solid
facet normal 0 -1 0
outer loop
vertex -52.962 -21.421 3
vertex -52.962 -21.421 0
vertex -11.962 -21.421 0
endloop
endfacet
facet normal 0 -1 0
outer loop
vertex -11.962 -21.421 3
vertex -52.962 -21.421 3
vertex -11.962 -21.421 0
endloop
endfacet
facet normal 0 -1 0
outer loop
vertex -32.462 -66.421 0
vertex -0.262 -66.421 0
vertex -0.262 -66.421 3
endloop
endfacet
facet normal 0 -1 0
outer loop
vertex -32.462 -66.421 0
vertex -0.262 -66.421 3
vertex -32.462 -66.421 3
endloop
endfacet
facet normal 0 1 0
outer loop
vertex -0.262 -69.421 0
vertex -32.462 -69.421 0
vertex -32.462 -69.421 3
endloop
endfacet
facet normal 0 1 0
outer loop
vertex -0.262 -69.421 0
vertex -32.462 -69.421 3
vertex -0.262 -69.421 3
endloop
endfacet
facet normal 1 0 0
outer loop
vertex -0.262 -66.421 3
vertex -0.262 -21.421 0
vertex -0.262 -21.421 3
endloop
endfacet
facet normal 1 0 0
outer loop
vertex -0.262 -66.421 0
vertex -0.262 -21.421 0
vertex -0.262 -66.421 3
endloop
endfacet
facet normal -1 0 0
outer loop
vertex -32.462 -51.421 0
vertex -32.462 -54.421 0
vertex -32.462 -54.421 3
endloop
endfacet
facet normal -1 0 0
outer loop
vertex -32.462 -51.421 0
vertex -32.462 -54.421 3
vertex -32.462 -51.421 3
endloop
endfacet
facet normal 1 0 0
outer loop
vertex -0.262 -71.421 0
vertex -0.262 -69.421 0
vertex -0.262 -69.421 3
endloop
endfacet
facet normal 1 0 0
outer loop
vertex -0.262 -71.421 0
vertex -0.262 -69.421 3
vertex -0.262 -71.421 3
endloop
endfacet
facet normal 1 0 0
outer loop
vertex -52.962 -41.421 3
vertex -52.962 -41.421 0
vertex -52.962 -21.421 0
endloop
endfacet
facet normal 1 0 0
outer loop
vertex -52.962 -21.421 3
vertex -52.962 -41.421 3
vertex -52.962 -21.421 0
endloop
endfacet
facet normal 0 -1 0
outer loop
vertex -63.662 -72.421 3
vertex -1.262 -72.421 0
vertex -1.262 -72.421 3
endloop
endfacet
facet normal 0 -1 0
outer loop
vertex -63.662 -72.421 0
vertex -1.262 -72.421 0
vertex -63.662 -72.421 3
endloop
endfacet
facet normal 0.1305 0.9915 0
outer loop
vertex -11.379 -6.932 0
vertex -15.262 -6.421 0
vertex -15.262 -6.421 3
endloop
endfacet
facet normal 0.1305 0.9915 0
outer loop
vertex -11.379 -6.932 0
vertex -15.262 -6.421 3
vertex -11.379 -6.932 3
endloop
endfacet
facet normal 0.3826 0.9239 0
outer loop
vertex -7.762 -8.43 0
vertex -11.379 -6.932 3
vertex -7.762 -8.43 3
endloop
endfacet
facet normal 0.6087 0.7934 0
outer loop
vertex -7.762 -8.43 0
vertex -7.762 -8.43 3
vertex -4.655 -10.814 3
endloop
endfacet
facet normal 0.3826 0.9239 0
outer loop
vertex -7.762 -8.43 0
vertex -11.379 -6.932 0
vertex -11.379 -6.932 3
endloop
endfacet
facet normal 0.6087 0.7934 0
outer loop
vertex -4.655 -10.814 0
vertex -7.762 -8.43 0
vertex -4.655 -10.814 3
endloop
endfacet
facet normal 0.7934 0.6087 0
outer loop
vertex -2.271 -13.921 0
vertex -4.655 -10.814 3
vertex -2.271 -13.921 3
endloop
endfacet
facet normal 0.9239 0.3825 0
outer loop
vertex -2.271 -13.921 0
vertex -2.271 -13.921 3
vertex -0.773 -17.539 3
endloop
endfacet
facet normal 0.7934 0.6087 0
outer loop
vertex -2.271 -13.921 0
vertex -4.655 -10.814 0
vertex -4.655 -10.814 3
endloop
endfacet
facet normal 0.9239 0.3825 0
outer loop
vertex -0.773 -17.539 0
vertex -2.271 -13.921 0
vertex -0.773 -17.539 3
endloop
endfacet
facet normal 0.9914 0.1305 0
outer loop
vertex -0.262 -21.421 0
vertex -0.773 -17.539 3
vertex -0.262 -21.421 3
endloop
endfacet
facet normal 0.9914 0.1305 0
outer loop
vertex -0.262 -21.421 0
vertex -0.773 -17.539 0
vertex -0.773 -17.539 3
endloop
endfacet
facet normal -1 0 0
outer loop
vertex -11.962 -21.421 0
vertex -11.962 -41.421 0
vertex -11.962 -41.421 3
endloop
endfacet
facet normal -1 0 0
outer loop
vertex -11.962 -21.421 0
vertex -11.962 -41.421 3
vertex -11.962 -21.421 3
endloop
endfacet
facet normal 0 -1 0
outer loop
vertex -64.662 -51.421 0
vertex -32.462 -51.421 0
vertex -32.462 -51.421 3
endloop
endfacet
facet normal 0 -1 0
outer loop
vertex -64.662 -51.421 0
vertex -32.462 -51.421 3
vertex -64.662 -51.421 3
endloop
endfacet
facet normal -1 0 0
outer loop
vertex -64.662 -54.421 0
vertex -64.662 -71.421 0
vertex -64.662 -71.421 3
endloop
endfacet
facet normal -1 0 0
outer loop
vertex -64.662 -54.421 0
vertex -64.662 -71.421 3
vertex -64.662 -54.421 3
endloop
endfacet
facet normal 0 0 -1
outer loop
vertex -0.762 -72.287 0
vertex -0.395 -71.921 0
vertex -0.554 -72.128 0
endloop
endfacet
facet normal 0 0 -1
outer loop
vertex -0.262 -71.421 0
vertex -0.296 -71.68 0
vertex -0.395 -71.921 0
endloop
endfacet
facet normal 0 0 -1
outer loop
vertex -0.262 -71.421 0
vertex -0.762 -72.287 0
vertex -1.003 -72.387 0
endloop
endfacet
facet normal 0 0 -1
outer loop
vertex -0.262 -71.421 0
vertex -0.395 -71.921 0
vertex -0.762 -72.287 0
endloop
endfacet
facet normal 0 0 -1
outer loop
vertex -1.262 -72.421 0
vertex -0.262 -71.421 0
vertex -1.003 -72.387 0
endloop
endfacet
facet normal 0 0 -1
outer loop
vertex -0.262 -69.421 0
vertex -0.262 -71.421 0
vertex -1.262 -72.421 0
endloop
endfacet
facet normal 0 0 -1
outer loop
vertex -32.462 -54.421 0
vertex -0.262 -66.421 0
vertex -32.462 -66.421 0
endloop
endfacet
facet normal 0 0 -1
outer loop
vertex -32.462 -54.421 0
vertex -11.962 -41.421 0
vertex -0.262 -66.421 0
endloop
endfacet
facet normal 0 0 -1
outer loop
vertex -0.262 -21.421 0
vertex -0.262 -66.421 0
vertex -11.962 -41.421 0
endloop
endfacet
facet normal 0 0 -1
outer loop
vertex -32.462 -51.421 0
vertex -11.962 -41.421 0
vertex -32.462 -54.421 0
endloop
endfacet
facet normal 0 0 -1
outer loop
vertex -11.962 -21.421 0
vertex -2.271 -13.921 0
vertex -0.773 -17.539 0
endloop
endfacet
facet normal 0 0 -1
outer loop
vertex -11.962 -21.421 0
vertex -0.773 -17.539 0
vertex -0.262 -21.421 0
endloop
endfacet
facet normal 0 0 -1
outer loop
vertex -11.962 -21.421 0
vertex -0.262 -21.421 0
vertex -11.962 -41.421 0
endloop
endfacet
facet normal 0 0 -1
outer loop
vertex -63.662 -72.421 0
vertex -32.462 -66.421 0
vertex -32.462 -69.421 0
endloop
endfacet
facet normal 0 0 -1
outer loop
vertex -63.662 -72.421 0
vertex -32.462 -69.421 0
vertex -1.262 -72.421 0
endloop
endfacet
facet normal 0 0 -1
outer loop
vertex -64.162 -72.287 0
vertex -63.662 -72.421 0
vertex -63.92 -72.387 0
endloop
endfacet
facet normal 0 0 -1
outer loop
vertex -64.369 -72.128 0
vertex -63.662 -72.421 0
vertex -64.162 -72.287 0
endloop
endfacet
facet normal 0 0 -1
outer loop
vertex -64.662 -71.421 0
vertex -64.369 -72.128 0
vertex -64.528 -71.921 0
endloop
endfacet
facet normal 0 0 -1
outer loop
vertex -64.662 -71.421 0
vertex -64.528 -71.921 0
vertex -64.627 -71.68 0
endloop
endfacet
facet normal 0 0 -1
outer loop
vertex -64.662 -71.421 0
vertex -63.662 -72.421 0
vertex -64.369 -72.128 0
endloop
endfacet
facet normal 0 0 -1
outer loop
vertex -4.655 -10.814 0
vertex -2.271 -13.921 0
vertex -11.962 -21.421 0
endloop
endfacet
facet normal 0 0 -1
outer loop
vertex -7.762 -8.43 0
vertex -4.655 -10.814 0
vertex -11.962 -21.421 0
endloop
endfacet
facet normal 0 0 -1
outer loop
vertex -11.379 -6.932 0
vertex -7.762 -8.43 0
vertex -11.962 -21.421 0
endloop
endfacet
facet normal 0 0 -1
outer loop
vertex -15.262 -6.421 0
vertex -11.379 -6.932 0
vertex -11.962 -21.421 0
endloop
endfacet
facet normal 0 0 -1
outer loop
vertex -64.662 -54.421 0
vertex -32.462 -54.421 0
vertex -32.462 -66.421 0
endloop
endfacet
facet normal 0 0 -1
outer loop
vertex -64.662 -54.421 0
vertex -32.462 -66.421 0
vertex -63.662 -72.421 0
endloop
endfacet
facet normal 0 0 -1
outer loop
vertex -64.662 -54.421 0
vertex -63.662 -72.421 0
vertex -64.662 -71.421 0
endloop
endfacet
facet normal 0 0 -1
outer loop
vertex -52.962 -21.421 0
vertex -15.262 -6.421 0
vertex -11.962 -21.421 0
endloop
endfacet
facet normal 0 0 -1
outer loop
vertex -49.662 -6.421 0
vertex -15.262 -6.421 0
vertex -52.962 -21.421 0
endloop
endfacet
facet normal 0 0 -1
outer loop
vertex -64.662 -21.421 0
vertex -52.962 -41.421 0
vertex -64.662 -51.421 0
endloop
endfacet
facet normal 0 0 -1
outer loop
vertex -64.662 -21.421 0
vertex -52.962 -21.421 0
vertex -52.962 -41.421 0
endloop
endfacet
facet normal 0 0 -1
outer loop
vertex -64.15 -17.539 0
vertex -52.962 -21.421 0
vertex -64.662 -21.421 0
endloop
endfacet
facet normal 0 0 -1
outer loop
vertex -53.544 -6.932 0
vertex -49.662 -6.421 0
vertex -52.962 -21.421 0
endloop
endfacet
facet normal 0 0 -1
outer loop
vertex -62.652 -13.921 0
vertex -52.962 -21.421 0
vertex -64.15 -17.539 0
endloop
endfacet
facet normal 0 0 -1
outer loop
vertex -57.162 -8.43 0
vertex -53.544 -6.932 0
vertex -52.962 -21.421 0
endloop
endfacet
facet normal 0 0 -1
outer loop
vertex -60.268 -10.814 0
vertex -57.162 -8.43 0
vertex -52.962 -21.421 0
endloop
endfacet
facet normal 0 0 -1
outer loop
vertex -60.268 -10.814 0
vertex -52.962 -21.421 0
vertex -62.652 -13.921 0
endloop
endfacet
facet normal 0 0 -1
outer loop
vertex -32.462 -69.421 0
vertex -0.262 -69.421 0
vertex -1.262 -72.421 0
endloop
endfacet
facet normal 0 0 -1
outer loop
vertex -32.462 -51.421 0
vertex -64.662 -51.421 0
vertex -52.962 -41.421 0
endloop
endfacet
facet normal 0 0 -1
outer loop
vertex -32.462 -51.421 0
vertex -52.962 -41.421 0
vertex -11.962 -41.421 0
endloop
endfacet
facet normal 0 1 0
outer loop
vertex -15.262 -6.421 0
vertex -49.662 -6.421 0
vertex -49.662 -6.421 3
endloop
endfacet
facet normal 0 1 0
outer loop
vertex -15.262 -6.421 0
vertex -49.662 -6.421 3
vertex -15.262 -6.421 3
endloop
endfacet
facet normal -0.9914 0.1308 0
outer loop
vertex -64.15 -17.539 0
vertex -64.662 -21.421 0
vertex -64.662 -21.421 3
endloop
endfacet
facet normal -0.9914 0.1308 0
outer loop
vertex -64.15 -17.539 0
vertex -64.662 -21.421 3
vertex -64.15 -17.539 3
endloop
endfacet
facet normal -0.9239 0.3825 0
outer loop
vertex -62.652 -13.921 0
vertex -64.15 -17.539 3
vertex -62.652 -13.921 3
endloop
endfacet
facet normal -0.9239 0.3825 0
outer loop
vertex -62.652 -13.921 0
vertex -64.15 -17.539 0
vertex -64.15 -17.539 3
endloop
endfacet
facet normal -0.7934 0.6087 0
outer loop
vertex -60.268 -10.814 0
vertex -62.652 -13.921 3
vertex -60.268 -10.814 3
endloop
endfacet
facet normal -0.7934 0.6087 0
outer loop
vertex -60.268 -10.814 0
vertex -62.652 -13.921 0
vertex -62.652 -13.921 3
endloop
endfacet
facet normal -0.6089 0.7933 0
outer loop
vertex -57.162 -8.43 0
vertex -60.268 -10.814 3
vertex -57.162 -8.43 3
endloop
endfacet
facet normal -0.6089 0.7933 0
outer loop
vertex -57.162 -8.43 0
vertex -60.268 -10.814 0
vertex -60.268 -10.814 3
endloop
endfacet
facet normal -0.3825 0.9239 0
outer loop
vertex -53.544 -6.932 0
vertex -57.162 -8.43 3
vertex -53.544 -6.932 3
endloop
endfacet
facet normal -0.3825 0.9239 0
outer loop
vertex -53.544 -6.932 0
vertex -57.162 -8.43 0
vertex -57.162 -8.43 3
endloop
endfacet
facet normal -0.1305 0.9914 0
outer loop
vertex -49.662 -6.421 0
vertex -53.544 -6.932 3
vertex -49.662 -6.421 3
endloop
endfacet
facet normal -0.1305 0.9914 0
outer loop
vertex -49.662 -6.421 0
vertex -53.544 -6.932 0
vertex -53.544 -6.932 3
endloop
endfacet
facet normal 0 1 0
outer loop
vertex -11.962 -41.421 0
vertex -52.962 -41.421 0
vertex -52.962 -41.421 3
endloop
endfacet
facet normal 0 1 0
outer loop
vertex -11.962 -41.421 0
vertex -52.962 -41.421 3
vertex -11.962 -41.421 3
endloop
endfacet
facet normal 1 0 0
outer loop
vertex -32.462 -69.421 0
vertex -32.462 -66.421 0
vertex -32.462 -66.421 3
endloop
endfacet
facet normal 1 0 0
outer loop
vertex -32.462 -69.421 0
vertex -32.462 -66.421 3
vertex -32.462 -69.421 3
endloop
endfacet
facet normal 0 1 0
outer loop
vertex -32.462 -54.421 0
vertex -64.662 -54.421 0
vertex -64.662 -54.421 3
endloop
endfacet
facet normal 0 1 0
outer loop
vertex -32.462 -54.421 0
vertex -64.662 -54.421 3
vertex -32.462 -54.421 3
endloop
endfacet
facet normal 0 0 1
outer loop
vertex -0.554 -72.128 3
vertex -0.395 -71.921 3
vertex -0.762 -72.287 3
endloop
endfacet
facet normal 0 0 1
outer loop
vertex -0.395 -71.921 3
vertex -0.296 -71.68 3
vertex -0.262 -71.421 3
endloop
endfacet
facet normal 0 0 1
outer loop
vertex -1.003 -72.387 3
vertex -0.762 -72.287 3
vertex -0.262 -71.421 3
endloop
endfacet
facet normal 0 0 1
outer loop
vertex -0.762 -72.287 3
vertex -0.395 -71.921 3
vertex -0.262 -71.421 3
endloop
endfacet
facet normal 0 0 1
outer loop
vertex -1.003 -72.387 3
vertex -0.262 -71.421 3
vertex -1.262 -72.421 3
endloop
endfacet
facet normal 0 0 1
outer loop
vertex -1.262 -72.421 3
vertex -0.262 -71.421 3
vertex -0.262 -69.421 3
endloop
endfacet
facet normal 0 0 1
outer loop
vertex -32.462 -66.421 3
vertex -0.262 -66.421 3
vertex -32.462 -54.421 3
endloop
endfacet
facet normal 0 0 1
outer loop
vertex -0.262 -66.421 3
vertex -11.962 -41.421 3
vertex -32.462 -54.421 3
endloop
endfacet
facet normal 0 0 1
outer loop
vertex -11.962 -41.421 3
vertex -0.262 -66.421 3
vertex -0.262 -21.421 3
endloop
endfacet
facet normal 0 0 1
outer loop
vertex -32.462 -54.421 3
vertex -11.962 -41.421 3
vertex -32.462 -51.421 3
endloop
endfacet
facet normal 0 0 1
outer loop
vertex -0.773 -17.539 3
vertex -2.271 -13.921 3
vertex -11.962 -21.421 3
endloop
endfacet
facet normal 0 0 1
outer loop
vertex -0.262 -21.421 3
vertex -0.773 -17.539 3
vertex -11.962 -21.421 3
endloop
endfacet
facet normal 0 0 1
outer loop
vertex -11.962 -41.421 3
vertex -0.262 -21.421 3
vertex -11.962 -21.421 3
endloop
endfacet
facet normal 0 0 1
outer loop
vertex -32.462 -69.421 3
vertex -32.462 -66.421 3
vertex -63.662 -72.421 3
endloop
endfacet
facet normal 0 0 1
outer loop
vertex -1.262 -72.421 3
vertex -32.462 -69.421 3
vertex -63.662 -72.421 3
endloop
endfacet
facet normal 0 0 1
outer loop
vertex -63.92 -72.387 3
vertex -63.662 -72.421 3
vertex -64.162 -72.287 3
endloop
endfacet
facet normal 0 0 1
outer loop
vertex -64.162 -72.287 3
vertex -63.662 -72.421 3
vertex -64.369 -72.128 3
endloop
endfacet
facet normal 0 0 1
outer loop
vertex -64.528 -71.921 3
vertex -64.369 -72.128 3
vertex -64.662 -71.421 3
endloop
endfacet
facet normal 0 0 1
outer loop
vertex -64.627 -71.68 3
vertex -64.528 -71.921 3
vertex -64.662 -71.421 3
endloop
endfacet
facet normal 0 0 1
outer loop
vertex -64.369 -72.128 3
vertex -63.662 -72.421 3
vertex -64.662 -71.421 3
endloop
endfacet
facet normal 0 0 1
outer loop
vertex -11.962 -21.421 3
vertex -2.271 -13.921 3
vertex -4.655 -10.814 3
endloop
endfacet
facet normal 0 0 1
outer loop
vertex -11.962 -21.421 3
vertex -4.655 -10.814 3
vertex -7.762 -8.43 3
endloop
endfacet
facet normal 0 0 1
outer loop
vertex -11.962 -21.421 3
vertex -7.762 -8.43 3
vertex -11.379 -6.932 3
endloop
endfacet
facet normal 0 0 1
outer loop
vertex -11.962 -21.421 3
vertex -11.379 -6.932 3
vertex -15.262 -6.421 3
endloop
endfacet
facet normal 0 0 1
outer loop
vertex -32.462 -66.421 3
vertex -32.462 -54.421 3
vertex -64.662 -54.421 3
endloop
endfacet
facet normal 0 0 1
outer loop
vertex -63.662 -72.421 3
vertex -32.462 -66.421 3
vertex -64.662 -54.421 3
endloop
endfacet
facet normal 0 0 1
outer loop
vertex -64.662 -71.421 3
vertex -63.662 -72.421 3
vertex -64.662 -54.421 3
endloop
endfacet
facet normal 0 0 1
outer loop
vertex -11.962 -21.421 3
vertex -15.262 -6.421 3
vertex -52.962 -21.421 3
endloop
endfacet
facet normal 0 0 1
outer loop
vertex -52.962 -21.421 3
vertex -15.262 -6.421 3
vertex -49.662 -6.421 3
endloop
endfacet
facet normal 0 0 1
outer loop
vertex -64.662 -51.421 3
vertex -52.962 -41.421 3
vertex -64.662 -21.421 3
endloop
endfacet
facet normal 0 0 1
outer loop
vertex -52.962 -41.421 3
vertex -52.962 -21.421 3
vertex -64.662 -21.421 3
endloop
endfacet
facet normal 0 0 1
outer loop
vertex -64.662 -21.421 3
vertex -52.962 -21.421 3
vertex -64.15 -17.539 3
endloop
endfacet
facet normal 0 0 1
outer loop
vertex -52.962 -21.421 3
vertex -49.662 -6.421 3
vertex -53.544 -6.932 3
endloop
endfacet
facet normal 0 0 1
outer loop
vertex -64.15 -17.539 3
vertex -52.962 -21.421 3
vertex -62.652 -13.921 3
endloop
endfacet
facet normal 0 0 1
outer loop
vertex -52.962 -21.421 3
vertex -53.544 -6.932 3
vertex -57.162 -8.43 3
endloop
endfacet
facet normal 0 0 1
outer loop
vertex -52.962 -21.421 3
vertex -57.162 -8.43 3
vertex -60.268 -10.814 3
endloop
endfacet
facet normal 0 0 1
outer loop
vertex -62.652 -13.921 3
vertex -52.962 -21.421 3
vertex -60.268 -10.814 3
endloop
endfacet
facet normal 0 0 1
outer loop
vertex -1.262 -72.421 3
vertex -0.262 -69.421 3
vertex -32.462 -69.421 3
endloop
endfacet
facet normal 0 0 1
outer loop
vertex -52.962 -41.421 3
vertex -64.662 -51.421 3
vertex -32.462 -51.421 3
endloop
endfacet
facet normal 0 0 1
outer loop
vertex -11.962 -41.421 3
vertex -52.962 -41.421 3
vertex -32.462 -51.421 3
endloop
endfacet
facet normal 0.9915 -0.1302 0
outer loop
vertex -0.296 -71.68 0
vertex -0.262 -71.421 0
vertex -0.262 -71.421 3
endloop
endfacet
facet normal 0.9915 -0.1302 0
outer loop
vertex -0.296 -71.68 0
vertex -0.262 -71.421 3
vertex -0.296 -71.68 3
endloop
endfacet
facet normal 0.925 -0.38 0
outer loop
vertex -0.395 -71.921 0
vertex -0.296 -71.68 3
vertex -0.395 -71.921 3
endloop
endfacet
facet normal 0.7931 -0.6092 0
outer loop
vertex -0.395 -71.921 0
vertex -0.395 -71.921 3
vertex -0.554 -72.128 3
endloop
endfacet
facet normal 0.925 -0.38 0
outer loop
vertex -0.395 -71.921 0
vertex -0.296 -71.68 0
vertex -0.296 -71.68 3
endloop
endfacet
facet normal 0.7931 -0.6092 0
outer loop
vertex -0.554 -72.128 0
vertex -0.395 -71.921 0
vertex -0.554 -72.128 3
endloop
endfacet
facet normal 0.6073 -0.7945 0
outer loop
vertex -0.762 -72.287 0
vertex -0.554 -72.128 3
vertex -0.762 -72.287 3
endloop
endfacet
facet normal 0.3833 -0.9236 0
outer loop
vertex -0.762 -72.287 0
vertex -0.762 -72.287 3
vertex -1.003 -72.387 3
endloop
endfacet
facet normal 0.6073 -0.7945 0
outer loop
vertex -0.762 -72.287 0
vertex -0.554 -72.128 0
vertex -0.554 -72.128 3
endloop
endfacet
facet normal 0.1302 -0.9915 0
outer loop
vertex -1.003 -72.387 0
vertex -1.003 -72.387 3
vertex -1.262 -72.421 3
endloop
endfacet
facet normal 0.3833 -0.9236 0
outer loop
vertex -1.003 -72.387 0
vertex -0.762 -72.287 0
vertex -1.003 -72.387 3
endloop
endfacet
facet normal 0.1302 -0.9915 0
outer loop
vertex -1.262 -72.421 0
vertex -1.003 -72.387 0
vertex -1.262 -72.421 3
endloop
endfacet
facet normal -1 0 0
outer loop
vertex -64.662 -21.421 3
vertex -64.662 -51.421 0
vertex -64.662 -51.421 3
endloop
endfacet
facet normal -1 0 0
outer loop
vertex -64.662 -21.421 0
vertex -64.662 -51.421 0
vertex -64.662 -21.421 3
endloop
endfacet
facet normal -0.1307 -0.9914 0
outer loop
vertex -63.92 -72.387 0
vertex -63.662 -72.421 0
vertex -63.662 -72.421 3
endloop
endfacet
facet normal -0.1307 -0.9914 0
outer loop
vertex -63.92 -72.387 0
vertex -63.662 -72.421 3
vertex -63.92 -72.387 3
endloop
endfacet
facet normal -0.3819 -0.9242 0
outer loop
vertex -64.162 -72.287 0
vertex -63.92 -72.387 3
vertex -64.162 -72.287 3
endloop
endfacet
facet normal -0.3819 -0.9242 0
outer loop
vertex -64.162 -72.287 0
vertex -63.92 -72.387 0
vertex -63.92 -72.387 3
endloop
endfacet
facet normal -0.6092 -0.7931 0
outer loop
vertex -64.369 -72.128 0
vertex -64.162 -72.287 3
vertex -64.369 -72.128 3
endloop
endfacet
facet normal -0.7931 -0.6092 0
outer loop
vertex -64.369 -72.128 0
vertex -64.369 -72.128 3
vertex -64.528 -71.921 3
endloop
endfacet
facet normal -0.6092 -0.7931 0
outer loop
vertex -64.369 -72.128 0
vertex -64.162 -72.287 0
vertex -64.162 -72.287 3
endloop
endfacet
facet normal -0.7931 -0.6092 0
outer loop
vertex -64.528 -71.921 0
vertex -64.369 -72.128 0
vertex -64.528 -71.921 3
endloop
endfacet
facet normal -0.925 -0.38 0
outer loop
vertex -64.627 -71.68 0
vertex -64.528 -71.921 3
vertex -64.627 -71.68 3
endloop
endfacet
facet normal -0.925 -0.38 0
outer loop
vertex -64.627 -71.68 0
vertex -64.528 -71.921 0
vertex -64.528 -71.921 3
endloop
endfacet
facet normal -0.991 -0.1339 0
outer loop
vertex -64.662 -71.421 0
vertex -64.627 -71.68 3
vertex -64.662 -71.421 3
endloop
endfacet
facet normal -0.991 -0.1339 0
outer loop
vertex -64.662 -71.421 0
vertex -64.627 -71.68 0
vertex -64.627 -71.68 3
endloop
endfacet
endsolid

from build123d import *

# Parameters (mm, degrees)
SKETCH1_W           = 41
SKETCH1_H           = 20
BOSS_EXTRUDE7_DEPTH = 3


with BuildPart() as part:
    # Sketch1 → Boss-Extrude7 (new body)
    with BuildSketch(Plane.XY):
        with BuildLine():
            Line((-49.661503554, -6.420867766), (-15.261503554, -6.420867766))
            ThreePointArc((-15.261503554, -6.420867766), (-4.654901836, -10.814266048), (-0.261503554, -21.420867766))
            Line((-0.261503554, -21.420867766), (-0.261503554, -66.420867766))
            Line((-0.261503554, -66.420867766), (-32.461503554, -66.420867766))
            Line((-32.461503554, -66.420867766), (-32.461503554, -69.420867766))
            Line((-32.461503554, -69.420867766), (-0.261503554, -69.420867766))
            Line((-0.261503554, -69.420867766), (-0.261503554, -71.420867766))
            ThreePointArc((-0.261503554, -71.420867766), (-0.554396773, -72.127974547), (-1.261503554, -72.420867766))
            Line((-1.261503554, -72.420867766), (-63.661503554, -72.420867766))
            ThreePointArc((-63.661503554, -72.420867766), (-64.368610335, -72.127974547), (-64.661503554, -71.420867766))
            Line((-64.661503554, -71.420867766), (-64.661503554, -54.420867766))
            Line((-64.661503554, -54.420867766), (-32.461503554, -54.420867766))
            Line((-32.461503554, -54.420867766), (-32.461503554, -51.420867766))
            Line((-32.461503554, -51.420867766), (-64.661503554, -51.420867766))
            Line((-64.661503554, -51.420867766), (-64.661503554, -21.420867766))
            ThreePointArc((-64.661503554, -21.420867766), (-60.268105272, -10.814266048), (-49.661503554, -6.420867766))
        make_face()
        with Locations((-32.461503554, -31.420867766)):
            Rectangle(SKETCH1_W, SKETCH1_H, mode=Mode.SUBTRACT)
    extrude(amount=BOSS_EXTRUDE7_DEPTH)


solid = part.part
